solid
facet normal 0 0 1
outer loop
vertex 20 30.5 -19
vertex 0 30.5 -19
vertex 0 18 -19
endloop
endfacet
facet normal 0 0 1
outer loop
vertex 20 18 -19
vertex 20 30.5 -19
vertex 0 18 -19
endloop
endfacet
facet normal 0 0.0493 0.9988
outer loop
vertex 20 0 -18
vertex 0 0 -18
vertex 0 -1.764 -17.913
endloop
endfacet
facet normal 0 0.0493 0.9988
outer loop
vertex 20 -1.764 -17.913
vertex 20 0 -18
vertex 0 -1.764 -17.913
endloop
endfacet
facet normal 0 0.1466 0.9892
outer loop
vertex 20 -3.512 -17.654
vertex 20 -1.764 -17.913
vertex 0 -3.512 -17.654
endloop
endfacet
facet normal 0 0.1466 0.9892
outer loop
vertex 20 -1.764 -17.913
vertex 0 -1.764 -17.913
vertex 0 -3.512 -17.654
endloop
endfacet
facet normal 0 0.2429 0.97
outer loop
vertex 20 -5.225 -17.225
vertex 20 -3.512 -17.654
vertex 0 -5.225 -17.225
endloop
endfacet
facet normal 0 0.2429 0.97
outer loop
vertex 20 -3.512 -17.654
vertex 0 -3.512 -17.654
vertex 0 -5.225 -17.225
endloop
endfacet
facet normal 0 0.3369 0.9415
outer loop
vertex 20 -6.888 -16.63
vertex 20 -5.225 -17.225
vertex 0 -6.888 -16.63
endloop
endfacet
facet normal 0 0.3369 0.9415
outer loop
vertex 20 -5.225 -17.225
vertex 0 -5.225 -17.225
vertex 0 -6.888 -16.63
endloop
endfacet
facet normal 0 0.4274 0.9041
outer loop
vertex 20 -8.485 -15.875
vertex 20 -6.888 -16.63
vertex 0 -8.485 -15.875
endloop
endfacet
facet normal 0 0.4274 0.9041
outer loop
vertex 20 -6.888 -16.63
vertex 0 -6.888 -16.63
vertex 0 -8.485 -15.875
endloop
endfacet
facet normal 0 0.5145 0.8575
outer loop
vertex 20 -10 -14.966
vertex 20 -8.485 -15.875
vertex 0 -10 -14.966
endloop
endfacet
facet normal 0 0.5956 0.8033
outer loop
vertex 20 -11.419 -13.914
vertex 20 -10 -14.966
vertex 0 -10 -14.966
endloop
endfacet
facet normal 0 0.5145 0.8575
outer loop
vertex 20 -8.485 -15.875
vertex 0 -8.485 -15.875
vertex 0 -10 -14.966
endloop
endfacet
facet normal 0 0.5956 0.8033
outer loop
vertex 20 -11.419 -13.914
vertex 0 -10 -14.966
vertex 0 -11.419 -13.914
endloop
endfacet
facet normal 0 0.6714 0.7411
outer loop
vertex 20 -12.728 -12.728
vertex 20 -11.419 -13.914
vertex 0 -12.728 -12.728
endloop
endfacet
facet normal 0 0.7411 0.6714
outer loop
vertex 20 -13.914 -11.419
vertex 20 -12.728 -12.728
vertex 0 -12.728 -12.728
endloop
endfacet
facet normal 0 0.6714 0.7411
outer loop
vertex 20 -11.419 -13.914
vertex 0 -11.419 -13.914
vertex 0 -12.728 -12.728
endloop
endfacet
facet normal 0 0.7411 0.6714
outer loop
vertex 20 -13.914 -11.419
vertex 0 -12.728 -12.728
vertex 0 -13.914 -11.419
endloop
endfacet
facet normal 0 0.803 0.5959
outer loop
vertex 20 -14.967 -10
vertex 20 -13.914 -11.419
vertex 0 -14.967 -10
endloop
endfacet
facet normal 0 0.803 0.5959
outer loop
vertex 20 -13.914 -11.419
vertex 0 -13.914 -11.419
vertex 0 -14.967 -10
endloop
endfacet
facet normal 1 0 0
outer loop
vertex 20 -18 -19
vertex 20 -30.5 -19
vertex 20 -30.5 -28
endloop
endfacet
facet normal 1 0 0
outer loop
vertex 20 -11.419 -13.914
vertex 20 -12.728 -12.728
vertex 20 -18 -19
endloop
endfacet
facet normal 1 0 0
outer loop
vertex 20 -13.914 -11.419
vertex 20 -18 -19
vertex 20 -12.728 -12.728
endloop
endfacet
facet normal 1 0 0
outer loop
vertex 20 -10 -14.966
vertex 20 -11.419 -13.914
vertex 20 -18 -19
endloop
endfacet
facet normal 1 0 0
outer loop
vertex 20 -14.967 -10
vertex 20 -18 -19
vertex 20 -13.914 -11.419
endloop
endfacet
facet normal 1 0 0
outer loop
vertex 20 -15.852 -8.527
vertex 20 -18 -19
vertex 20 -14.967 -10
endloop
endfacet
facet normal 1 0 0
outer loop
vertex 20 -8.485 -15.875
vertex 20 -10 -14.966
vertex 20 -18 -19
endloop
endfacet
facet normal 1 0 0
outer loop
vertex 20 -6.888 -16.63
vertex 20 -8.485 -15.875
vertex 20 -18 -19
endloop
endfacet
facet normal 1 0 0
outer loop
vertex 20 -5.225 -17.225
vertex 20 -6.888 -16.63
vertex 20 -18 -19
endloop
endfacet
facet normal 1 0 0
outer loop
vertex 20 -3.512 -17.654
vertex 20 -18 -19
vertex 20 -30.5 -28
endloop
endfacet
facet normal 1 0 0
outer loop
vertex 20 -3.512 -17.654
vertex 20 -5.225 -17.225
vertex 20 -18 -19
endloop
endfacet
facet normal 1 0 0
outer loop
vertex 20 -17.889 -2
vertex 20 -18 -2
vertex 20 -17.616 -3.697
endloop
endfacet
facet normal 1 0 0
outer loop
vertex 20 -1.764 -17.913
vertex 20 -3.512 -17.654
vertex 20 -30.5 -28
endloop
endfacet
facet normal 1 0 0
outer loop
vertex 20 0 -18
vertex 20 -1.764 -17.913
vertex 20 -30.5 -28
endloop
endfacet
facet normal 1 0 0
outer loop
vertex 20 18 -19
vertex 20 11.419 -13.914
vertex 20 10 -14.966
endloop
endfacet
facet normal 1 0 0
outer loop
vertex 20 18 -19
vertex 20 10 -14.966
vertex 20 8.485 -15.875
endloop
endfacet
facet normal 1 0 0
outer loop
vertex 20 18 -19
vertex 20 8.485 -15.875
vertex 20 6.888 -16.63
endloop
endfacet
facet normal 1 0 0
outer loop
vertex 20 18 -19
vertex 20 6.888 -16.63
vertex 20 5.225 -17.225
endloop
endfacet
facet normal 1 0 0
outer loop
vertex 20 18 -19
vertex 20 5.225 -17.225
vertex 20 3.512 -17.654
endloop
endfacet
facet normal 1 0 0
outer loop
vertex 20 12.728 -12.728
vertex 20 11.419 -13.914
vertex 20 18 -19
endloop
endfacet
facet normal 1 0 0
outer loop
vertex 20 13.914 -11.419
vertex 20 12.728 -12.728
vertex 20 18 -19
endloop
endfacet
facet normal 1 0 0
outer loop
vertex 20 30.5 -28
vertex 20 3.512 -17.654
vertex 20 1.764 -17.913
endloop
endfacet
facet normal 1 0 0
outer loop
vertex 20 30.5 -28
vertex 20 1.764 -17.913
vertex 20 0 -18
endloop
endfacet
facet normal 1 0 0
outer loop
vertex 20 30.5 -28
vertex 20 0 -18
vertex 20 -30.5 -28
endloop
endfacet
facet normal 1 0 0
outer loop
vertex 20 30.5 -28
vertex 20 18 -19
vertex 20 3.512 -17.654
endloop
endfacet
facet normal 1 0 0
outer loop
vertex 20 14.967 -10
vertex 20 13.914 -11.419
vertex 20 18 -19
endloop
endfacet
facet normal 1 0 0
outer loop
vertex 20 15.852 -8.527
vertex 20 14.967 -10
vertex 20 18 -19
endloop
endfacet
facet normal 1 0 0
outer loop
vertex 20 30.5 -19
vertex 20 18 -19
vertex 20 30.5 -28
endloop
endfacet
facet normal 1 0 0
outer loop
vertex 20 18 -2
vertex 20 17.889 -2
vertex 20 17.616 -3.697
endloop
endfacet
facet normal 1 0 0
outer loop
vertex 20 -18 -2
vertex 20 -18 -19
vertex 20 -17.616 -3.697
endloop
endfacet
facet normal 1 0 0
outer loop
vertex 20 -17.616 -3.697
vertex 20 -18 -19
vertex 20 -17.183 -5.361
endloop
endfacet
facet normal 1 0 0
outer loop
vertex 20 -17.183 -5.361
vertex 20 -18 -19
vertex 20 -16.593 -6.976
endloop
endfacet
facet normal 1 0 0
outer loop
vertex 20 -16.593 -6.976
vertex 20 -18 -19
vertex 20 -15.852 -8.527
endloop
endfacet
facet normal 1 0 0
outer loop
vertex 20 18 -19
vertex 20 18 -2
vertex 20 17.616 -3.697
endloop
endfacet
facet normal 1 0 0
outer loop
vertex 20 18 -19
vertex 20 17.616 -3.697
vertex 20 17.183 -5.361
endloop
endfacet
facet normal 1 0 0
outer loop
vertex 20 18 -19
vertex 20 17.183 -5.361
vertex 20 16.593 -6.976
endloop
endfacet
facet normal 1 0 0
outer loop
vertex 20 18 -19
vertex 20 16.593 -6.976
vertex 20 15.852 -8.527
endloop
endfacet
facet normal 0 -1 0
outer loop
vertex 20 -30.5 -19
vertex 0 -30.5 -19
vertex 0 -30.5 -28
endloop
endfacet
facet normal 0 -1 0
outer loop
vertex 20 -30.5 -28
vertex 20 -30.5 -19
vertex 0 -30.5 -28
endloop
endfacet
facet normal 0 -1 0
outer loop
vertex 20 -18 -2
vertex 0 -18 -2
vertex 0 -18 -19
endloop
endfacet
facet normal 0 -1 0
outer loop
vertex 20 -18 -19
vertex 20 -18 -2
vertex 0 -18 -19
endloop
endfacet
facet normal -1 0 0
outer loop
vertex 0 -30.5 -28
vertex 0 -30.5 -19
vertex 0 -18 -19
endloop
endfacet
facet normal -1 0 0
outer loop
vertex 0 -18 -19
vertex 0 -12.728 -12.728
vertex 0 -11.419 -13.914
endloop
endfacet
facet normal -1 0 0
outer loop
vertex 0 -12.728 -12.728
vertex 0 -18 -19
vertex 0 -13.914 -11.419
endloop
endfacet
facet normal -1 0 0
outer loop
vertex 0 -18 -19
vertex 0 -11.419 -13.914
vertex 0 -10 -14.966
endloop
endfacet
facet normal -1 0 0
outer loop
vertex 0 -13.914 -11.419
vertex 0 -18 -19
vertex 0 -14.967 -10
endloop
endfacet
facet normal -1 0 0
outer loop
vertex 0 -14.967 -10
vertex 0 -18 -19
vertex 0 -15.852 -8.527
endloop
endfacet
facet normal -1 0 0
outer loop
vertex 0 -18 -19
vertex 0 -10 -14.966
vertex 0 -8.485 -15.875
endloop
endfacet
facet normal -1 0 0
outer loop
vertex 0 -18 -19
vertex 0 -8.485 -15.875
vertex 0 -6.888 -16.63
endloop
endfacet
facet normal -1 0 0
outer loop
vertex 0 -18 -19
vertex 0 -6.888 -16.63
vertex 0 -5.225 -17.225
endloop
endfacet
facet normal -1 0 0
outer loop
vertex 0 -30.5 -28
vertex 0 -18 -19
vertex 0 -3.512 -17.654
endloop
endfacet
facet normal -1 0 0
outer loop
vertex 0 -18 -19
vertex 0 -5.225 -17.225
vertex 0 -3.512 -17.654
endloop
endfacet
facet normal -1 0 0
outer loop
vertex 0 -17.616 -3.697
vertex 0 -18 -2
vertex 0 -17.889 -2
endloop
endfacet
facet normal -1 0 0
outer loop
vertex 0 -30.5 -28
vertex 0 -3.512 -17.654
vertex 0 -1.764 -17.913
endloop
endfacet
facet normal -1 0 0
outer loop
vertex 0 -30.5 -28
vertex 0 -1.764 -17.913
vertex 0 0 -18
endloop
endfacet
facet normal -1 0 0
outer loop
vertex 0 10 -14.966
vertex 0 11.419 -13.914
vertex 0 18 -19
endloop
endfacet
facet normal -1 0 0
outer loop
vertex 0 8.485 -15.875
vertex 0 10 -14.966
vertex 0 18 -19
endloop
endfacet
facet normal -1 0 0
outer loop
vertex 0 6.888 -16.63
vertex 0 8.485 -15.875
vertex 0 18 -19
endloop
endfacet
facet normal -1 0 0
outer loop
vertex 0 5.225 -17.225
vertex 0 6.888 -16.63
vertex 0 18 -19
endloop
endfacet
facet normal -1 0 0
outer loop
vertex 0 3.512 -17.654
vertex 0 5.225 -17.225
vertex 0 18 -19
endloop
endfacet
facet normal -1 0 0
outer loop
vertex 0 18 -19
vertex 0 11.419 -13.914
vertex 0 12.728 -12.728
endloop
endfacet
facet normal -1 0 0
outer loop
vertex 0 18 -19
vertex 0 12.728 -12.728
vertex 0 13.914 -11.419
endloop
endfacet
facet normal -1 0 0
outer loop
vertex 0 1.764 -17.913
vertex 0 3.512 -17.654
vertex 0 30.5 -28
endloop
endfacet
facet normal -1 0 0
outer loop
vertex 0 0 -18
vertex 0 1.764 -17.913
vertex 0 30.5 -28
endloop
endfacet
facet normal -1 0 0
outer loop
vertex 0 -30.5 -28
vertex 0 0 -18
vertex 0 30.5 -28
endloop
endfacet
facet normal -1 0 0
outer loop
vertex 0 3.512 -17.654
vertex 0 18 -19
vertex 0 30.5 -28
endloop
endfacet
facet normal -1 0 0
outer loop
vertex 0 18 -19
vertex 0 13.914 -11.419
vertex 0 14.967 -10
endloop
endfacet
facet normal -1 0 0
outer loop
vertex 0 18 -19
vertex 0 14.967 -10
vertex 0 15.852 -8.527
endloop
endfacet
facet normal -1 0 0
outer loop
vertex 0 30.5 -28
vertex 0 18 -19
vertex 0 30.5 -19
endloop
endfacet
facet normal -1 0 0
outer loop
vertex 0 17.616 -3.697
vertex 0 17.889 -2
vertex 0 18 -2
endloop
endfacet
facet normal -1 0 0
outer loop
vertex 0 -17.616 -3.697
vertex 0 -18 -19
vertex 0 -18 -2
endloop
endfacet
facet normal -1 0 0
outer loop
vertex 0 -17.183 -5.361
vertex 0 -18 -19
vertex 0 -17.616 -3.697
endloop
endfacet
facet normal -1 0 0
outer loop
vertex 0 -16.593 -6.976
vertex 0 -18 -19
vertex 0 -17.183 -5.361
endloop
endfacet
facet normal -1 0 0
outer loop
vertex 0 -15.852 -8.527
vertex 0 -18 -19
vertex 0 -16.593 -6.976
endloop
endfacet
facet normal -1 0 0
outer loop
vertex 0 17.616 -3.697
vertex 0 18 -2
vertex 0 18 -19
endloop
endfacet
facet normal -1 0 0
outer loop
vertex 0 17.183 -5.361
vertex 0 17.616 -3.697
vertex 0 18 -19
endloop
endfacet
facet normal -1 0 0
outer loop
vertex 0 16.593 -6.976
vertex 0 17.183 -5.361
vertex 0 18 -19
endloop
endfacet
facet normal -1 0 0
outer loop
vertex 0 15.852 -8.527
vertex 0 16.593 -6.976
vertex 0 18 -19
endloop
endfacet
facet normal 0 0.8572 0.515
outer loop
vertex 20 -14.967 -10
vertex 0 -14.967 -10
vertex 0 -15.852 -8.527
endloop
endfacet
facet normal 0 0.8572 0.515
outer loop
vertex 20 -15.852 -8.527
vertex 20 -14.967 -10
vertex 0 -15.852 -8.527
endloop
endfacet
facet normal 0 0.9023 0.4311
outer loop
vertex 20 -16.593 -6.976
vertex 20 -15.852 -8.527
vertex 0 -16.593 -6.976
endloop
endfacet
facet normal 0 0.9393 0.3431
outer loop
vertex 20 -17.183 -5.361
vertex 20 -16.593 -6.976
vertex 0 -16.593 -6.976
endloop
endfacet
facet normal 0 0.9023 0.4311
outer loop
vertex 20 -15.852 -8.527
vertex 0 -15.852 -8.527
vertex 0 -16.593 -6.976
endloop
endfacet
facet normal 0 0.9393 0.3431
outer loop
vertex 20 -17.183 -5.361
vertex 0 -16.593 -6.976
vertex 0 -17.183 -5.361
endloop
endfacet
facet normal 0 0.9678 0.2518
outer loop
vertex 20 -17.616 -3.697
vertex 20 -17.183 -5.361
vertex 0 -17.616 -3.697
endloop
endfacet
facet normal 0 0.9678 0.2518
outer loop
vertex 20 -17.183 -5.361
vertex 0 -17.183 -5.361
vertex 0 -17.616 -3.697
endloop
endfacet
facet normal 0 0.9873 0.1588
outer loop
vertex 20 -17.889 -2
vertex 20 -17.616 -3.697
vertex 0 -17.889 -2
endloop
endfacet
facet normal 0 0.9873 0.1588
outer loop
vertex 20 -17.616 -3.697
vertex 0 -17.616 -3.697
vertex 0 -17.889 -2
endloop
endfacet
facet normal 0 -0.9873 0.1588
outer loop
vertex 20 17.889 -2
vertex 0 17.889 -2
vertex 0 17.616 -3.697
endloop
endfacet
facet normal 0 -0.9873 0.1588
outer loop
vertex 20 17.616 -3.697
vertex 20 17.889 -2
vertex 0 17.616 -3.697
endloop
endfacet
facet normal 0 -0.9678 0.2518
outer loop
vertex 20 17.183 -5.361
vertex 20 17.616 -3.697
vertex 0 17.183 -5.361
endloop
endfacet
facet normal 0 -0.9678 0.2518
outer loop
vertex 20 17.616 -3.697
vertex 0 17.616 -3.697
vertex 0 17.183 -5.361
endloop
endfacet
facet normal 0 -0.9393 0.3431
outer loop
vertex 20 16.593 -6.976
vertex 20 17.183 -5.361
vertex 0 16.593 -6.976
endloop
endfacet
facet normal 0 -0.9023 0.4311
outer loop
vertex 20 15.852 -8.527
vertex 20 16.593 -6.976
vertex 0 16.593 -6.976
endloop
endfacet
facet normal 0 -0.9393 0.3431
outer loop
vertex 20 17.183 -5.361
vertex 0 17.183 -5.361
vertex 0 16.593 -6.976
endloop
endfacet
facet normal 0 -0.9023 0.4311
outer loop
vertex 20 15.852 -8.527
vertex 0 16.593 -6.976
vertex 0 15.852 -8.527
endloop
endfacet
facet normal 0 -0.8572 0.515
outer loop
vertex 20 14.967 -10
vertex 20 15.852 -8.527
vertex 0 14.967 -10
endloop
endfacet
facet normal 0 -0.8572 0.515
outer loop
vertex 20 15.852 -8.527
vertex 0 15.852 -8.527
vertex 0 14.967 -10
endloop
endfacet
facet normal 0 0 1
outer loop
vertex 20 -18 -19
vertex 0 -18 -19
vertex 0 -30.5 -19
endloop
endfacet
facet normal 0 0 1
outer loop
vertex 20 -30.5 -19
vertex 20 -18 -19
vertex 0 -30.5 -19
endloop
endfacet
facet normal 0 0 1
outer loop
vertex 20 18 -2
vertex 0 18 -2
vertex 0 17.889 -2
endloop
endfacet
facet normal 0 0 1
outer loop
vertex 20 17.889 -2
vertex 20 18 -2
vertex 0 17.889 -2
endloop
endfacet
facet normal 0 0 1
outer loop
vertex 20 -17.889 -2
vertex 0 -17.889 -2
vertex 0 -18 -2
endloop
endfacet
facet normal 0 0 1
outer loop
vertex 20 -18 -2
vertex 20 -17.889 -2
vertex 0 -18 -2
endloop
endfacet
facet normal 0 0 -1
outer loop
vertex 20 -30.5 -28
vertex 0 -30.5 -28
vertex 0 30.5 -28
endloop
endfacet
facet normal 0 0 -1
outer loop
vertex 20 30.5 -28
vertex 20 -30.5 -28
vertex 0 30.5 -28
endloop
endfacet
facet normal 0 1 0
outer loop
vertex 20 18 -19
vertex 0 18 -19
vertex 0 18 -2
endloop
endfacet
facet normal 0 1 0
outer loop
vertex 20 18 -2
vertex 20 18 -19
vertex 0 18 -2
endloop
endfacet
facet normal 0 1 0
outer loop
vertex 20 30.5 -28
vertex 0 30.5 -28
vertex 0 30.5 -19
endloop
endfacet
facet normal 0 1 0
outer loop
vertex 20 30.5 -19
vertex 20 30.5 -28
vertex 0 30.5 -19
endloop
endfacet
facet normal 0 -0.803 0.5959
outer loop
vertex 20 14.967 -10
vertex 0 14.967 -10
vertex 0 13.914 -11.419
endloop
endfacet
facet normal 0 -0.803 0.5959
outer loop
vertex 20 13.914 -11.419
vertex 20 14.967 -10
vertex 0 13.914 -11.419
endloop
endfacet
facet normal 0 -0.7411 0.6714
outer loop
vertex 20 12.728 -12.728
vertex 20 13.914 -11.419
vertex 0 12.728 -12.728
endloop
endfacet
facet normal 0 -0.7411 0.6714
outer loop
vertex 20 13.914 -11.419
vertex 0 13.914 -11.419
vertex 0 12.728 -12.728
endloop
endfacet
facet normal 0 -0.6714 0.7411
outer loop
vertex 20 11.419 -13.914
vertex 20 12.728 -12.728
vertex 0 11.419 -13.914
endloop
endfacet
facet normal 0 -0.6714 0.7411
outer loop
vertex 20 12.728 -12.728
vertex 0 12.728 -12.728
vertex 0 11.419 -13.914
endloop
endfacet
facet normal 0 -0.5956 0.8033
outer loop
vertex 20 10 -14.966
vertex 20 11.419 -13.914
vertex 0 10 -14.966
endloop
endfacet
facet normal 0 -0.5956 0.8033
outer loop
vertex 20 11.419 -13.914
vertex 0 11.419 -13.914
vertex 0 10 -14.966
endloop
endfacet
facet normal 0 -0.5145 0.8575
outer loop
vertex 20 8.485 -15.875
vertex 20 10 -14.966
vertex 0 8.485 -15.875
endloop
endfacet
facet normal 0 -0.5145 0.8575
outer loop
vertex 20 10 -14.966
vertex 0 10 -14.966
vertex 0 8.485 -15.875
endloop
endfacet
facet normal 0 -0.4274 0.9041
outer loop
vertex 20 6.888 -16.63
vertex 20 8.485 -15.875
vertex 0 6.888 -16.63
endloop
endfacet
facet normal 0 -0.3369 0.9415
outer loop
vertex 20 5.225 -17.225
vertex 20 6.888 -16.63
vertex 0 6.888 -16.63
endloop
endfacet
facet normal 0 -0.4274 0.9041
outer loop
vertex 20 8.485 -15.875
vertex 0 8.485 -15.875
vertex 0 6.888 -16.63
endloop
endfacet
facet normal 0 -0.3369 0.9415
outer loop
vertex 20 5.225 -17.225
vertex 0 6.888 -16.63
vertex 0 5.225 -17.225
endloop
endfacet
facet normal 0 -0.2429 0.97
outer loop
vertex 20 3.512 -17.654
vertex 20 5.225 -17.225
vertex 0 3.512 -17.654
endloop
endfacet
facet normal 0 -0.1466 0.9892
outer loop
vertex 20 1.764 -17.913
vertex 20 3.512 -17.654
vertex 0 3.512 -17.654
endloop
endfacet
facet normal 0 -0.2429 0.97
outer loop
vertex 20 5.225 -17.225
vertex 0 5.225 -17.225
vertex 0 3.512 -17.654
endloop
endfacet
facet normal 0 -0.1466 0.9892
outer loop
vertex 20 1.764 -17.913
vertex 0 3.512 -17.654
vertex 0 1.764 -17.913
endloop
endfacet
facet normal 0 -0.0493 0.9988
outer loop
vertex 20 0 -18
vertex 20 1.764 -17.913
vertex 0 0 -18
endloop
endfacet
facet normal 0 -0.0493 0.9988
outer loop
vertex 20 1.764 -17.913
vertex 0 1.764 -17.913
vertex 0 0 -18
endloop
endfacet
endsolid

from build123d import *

# Parameters (mm, degrees)
F1_DEPTH = 20


with BuildPart() as f1:
    # F0 (on Right) → F1 (new body)
    with BuildSketch(Plane.YZ):
        with BuildLine():
            Line((18, -2), (17.88854382, -2))
            ThreePointArc((17.88854382, -2), (16.9075605646, -6.1753053167), (14.9666295471, -10))
            Line((14.9666295471, -10), (18, -10))
            Line((18, -10), (18, -2))
        make_face()
        with BuildLine():
            Line((18, -10), (14.9666295471, -10))
            ThreePointArc((14.9666295471, -10), (8.4852813742, -15.8745078664), (0, -18))
            Line((0, -18), (14.3178210633, -18))
            ThreePointArc((14.3178210633, -18), (16.2634559673, -16.2634559673), (18, -14.3178210633))
            Line((18, -14.3178210633), (18, -10))
        make_face()
        with BuildLine():
            Line((-14.3178210633, -18), (0, -18))
            ThreePointArc((0, -18), (-8.4852813742, -15.8745078664), (-14.9666295471, -10))
            Line((-14.9666295471, -10), (-18, -10))
            Line((-18, -10), (-18, -14.3178210633))
            ThreePointArc((-18, -14.3178210633), (-16.2634559673, -16.2634559673), (-14.3178210633, -18))
        make_face()
        with BuildLine():
            Line((14.3178210633, -18), (0, -18))
            Line((0, -18), (-14.3178210633, -18))
            ThreePointArc((-14.3178210633, -18), (0, -23), (14.3178210633, -18))
        make_face()
        with BuildLine():
            ThreePointArc((-14.9666295471, -10), (-16.9075605646, -6.1753053167), (-17.88854382, -2))
            Line((-17.88854382, -2), (-18, -2))
            Line((-18, -2), (-18, -10))
            Line((-18, -10), (-14.9666295471, -10))
        make_face()
        with BuildLine():
            Line((18, -18), (14.3178210633, -18))
            ThreePointArc((14.3178210633, -18), (0, -23), (-14.3178210633, -18))
            Line((-14.3178210633, -18), (-17, -18))
            Line((-17, -18), (-18, -18))
            Line((-18, -18), (-18, -19))
            Line((-18, -19), (-30.5, -19))
            Line((-30.5, -19), (-30.5, -28))
            Line((-30.5, -28), (30.5, -28))
            Line((30.5, -28), (30.5, -19))
            Line((30.5, -19), (18, -19))
            Line((18, -19), (18, -18))
        make_face()
        with BuildLine():
            ThreePointArc((18, -14.3178210633), (16.2634559673, -16.2634559673), (14.3178210633, -18))
            Line((14.3178210633, -18), (18, -18))
            Line((18, -18), (18, -14.3178210633))
        make_face()
        with BuildLine():
            Line((-17, -18), (-14.3178210633, -18))
            ThreePointArc((-14.3178210633, -18), (-16.2634559673, -16.2634559673), (-18, -14.3178210633))
            Line((-18, -14.3178210633), (-18, -18))
            Line((-18, -18), (-17, -18))
        make_face()
    extrude(amount=F1_DEPTH)


solid = f1.part
